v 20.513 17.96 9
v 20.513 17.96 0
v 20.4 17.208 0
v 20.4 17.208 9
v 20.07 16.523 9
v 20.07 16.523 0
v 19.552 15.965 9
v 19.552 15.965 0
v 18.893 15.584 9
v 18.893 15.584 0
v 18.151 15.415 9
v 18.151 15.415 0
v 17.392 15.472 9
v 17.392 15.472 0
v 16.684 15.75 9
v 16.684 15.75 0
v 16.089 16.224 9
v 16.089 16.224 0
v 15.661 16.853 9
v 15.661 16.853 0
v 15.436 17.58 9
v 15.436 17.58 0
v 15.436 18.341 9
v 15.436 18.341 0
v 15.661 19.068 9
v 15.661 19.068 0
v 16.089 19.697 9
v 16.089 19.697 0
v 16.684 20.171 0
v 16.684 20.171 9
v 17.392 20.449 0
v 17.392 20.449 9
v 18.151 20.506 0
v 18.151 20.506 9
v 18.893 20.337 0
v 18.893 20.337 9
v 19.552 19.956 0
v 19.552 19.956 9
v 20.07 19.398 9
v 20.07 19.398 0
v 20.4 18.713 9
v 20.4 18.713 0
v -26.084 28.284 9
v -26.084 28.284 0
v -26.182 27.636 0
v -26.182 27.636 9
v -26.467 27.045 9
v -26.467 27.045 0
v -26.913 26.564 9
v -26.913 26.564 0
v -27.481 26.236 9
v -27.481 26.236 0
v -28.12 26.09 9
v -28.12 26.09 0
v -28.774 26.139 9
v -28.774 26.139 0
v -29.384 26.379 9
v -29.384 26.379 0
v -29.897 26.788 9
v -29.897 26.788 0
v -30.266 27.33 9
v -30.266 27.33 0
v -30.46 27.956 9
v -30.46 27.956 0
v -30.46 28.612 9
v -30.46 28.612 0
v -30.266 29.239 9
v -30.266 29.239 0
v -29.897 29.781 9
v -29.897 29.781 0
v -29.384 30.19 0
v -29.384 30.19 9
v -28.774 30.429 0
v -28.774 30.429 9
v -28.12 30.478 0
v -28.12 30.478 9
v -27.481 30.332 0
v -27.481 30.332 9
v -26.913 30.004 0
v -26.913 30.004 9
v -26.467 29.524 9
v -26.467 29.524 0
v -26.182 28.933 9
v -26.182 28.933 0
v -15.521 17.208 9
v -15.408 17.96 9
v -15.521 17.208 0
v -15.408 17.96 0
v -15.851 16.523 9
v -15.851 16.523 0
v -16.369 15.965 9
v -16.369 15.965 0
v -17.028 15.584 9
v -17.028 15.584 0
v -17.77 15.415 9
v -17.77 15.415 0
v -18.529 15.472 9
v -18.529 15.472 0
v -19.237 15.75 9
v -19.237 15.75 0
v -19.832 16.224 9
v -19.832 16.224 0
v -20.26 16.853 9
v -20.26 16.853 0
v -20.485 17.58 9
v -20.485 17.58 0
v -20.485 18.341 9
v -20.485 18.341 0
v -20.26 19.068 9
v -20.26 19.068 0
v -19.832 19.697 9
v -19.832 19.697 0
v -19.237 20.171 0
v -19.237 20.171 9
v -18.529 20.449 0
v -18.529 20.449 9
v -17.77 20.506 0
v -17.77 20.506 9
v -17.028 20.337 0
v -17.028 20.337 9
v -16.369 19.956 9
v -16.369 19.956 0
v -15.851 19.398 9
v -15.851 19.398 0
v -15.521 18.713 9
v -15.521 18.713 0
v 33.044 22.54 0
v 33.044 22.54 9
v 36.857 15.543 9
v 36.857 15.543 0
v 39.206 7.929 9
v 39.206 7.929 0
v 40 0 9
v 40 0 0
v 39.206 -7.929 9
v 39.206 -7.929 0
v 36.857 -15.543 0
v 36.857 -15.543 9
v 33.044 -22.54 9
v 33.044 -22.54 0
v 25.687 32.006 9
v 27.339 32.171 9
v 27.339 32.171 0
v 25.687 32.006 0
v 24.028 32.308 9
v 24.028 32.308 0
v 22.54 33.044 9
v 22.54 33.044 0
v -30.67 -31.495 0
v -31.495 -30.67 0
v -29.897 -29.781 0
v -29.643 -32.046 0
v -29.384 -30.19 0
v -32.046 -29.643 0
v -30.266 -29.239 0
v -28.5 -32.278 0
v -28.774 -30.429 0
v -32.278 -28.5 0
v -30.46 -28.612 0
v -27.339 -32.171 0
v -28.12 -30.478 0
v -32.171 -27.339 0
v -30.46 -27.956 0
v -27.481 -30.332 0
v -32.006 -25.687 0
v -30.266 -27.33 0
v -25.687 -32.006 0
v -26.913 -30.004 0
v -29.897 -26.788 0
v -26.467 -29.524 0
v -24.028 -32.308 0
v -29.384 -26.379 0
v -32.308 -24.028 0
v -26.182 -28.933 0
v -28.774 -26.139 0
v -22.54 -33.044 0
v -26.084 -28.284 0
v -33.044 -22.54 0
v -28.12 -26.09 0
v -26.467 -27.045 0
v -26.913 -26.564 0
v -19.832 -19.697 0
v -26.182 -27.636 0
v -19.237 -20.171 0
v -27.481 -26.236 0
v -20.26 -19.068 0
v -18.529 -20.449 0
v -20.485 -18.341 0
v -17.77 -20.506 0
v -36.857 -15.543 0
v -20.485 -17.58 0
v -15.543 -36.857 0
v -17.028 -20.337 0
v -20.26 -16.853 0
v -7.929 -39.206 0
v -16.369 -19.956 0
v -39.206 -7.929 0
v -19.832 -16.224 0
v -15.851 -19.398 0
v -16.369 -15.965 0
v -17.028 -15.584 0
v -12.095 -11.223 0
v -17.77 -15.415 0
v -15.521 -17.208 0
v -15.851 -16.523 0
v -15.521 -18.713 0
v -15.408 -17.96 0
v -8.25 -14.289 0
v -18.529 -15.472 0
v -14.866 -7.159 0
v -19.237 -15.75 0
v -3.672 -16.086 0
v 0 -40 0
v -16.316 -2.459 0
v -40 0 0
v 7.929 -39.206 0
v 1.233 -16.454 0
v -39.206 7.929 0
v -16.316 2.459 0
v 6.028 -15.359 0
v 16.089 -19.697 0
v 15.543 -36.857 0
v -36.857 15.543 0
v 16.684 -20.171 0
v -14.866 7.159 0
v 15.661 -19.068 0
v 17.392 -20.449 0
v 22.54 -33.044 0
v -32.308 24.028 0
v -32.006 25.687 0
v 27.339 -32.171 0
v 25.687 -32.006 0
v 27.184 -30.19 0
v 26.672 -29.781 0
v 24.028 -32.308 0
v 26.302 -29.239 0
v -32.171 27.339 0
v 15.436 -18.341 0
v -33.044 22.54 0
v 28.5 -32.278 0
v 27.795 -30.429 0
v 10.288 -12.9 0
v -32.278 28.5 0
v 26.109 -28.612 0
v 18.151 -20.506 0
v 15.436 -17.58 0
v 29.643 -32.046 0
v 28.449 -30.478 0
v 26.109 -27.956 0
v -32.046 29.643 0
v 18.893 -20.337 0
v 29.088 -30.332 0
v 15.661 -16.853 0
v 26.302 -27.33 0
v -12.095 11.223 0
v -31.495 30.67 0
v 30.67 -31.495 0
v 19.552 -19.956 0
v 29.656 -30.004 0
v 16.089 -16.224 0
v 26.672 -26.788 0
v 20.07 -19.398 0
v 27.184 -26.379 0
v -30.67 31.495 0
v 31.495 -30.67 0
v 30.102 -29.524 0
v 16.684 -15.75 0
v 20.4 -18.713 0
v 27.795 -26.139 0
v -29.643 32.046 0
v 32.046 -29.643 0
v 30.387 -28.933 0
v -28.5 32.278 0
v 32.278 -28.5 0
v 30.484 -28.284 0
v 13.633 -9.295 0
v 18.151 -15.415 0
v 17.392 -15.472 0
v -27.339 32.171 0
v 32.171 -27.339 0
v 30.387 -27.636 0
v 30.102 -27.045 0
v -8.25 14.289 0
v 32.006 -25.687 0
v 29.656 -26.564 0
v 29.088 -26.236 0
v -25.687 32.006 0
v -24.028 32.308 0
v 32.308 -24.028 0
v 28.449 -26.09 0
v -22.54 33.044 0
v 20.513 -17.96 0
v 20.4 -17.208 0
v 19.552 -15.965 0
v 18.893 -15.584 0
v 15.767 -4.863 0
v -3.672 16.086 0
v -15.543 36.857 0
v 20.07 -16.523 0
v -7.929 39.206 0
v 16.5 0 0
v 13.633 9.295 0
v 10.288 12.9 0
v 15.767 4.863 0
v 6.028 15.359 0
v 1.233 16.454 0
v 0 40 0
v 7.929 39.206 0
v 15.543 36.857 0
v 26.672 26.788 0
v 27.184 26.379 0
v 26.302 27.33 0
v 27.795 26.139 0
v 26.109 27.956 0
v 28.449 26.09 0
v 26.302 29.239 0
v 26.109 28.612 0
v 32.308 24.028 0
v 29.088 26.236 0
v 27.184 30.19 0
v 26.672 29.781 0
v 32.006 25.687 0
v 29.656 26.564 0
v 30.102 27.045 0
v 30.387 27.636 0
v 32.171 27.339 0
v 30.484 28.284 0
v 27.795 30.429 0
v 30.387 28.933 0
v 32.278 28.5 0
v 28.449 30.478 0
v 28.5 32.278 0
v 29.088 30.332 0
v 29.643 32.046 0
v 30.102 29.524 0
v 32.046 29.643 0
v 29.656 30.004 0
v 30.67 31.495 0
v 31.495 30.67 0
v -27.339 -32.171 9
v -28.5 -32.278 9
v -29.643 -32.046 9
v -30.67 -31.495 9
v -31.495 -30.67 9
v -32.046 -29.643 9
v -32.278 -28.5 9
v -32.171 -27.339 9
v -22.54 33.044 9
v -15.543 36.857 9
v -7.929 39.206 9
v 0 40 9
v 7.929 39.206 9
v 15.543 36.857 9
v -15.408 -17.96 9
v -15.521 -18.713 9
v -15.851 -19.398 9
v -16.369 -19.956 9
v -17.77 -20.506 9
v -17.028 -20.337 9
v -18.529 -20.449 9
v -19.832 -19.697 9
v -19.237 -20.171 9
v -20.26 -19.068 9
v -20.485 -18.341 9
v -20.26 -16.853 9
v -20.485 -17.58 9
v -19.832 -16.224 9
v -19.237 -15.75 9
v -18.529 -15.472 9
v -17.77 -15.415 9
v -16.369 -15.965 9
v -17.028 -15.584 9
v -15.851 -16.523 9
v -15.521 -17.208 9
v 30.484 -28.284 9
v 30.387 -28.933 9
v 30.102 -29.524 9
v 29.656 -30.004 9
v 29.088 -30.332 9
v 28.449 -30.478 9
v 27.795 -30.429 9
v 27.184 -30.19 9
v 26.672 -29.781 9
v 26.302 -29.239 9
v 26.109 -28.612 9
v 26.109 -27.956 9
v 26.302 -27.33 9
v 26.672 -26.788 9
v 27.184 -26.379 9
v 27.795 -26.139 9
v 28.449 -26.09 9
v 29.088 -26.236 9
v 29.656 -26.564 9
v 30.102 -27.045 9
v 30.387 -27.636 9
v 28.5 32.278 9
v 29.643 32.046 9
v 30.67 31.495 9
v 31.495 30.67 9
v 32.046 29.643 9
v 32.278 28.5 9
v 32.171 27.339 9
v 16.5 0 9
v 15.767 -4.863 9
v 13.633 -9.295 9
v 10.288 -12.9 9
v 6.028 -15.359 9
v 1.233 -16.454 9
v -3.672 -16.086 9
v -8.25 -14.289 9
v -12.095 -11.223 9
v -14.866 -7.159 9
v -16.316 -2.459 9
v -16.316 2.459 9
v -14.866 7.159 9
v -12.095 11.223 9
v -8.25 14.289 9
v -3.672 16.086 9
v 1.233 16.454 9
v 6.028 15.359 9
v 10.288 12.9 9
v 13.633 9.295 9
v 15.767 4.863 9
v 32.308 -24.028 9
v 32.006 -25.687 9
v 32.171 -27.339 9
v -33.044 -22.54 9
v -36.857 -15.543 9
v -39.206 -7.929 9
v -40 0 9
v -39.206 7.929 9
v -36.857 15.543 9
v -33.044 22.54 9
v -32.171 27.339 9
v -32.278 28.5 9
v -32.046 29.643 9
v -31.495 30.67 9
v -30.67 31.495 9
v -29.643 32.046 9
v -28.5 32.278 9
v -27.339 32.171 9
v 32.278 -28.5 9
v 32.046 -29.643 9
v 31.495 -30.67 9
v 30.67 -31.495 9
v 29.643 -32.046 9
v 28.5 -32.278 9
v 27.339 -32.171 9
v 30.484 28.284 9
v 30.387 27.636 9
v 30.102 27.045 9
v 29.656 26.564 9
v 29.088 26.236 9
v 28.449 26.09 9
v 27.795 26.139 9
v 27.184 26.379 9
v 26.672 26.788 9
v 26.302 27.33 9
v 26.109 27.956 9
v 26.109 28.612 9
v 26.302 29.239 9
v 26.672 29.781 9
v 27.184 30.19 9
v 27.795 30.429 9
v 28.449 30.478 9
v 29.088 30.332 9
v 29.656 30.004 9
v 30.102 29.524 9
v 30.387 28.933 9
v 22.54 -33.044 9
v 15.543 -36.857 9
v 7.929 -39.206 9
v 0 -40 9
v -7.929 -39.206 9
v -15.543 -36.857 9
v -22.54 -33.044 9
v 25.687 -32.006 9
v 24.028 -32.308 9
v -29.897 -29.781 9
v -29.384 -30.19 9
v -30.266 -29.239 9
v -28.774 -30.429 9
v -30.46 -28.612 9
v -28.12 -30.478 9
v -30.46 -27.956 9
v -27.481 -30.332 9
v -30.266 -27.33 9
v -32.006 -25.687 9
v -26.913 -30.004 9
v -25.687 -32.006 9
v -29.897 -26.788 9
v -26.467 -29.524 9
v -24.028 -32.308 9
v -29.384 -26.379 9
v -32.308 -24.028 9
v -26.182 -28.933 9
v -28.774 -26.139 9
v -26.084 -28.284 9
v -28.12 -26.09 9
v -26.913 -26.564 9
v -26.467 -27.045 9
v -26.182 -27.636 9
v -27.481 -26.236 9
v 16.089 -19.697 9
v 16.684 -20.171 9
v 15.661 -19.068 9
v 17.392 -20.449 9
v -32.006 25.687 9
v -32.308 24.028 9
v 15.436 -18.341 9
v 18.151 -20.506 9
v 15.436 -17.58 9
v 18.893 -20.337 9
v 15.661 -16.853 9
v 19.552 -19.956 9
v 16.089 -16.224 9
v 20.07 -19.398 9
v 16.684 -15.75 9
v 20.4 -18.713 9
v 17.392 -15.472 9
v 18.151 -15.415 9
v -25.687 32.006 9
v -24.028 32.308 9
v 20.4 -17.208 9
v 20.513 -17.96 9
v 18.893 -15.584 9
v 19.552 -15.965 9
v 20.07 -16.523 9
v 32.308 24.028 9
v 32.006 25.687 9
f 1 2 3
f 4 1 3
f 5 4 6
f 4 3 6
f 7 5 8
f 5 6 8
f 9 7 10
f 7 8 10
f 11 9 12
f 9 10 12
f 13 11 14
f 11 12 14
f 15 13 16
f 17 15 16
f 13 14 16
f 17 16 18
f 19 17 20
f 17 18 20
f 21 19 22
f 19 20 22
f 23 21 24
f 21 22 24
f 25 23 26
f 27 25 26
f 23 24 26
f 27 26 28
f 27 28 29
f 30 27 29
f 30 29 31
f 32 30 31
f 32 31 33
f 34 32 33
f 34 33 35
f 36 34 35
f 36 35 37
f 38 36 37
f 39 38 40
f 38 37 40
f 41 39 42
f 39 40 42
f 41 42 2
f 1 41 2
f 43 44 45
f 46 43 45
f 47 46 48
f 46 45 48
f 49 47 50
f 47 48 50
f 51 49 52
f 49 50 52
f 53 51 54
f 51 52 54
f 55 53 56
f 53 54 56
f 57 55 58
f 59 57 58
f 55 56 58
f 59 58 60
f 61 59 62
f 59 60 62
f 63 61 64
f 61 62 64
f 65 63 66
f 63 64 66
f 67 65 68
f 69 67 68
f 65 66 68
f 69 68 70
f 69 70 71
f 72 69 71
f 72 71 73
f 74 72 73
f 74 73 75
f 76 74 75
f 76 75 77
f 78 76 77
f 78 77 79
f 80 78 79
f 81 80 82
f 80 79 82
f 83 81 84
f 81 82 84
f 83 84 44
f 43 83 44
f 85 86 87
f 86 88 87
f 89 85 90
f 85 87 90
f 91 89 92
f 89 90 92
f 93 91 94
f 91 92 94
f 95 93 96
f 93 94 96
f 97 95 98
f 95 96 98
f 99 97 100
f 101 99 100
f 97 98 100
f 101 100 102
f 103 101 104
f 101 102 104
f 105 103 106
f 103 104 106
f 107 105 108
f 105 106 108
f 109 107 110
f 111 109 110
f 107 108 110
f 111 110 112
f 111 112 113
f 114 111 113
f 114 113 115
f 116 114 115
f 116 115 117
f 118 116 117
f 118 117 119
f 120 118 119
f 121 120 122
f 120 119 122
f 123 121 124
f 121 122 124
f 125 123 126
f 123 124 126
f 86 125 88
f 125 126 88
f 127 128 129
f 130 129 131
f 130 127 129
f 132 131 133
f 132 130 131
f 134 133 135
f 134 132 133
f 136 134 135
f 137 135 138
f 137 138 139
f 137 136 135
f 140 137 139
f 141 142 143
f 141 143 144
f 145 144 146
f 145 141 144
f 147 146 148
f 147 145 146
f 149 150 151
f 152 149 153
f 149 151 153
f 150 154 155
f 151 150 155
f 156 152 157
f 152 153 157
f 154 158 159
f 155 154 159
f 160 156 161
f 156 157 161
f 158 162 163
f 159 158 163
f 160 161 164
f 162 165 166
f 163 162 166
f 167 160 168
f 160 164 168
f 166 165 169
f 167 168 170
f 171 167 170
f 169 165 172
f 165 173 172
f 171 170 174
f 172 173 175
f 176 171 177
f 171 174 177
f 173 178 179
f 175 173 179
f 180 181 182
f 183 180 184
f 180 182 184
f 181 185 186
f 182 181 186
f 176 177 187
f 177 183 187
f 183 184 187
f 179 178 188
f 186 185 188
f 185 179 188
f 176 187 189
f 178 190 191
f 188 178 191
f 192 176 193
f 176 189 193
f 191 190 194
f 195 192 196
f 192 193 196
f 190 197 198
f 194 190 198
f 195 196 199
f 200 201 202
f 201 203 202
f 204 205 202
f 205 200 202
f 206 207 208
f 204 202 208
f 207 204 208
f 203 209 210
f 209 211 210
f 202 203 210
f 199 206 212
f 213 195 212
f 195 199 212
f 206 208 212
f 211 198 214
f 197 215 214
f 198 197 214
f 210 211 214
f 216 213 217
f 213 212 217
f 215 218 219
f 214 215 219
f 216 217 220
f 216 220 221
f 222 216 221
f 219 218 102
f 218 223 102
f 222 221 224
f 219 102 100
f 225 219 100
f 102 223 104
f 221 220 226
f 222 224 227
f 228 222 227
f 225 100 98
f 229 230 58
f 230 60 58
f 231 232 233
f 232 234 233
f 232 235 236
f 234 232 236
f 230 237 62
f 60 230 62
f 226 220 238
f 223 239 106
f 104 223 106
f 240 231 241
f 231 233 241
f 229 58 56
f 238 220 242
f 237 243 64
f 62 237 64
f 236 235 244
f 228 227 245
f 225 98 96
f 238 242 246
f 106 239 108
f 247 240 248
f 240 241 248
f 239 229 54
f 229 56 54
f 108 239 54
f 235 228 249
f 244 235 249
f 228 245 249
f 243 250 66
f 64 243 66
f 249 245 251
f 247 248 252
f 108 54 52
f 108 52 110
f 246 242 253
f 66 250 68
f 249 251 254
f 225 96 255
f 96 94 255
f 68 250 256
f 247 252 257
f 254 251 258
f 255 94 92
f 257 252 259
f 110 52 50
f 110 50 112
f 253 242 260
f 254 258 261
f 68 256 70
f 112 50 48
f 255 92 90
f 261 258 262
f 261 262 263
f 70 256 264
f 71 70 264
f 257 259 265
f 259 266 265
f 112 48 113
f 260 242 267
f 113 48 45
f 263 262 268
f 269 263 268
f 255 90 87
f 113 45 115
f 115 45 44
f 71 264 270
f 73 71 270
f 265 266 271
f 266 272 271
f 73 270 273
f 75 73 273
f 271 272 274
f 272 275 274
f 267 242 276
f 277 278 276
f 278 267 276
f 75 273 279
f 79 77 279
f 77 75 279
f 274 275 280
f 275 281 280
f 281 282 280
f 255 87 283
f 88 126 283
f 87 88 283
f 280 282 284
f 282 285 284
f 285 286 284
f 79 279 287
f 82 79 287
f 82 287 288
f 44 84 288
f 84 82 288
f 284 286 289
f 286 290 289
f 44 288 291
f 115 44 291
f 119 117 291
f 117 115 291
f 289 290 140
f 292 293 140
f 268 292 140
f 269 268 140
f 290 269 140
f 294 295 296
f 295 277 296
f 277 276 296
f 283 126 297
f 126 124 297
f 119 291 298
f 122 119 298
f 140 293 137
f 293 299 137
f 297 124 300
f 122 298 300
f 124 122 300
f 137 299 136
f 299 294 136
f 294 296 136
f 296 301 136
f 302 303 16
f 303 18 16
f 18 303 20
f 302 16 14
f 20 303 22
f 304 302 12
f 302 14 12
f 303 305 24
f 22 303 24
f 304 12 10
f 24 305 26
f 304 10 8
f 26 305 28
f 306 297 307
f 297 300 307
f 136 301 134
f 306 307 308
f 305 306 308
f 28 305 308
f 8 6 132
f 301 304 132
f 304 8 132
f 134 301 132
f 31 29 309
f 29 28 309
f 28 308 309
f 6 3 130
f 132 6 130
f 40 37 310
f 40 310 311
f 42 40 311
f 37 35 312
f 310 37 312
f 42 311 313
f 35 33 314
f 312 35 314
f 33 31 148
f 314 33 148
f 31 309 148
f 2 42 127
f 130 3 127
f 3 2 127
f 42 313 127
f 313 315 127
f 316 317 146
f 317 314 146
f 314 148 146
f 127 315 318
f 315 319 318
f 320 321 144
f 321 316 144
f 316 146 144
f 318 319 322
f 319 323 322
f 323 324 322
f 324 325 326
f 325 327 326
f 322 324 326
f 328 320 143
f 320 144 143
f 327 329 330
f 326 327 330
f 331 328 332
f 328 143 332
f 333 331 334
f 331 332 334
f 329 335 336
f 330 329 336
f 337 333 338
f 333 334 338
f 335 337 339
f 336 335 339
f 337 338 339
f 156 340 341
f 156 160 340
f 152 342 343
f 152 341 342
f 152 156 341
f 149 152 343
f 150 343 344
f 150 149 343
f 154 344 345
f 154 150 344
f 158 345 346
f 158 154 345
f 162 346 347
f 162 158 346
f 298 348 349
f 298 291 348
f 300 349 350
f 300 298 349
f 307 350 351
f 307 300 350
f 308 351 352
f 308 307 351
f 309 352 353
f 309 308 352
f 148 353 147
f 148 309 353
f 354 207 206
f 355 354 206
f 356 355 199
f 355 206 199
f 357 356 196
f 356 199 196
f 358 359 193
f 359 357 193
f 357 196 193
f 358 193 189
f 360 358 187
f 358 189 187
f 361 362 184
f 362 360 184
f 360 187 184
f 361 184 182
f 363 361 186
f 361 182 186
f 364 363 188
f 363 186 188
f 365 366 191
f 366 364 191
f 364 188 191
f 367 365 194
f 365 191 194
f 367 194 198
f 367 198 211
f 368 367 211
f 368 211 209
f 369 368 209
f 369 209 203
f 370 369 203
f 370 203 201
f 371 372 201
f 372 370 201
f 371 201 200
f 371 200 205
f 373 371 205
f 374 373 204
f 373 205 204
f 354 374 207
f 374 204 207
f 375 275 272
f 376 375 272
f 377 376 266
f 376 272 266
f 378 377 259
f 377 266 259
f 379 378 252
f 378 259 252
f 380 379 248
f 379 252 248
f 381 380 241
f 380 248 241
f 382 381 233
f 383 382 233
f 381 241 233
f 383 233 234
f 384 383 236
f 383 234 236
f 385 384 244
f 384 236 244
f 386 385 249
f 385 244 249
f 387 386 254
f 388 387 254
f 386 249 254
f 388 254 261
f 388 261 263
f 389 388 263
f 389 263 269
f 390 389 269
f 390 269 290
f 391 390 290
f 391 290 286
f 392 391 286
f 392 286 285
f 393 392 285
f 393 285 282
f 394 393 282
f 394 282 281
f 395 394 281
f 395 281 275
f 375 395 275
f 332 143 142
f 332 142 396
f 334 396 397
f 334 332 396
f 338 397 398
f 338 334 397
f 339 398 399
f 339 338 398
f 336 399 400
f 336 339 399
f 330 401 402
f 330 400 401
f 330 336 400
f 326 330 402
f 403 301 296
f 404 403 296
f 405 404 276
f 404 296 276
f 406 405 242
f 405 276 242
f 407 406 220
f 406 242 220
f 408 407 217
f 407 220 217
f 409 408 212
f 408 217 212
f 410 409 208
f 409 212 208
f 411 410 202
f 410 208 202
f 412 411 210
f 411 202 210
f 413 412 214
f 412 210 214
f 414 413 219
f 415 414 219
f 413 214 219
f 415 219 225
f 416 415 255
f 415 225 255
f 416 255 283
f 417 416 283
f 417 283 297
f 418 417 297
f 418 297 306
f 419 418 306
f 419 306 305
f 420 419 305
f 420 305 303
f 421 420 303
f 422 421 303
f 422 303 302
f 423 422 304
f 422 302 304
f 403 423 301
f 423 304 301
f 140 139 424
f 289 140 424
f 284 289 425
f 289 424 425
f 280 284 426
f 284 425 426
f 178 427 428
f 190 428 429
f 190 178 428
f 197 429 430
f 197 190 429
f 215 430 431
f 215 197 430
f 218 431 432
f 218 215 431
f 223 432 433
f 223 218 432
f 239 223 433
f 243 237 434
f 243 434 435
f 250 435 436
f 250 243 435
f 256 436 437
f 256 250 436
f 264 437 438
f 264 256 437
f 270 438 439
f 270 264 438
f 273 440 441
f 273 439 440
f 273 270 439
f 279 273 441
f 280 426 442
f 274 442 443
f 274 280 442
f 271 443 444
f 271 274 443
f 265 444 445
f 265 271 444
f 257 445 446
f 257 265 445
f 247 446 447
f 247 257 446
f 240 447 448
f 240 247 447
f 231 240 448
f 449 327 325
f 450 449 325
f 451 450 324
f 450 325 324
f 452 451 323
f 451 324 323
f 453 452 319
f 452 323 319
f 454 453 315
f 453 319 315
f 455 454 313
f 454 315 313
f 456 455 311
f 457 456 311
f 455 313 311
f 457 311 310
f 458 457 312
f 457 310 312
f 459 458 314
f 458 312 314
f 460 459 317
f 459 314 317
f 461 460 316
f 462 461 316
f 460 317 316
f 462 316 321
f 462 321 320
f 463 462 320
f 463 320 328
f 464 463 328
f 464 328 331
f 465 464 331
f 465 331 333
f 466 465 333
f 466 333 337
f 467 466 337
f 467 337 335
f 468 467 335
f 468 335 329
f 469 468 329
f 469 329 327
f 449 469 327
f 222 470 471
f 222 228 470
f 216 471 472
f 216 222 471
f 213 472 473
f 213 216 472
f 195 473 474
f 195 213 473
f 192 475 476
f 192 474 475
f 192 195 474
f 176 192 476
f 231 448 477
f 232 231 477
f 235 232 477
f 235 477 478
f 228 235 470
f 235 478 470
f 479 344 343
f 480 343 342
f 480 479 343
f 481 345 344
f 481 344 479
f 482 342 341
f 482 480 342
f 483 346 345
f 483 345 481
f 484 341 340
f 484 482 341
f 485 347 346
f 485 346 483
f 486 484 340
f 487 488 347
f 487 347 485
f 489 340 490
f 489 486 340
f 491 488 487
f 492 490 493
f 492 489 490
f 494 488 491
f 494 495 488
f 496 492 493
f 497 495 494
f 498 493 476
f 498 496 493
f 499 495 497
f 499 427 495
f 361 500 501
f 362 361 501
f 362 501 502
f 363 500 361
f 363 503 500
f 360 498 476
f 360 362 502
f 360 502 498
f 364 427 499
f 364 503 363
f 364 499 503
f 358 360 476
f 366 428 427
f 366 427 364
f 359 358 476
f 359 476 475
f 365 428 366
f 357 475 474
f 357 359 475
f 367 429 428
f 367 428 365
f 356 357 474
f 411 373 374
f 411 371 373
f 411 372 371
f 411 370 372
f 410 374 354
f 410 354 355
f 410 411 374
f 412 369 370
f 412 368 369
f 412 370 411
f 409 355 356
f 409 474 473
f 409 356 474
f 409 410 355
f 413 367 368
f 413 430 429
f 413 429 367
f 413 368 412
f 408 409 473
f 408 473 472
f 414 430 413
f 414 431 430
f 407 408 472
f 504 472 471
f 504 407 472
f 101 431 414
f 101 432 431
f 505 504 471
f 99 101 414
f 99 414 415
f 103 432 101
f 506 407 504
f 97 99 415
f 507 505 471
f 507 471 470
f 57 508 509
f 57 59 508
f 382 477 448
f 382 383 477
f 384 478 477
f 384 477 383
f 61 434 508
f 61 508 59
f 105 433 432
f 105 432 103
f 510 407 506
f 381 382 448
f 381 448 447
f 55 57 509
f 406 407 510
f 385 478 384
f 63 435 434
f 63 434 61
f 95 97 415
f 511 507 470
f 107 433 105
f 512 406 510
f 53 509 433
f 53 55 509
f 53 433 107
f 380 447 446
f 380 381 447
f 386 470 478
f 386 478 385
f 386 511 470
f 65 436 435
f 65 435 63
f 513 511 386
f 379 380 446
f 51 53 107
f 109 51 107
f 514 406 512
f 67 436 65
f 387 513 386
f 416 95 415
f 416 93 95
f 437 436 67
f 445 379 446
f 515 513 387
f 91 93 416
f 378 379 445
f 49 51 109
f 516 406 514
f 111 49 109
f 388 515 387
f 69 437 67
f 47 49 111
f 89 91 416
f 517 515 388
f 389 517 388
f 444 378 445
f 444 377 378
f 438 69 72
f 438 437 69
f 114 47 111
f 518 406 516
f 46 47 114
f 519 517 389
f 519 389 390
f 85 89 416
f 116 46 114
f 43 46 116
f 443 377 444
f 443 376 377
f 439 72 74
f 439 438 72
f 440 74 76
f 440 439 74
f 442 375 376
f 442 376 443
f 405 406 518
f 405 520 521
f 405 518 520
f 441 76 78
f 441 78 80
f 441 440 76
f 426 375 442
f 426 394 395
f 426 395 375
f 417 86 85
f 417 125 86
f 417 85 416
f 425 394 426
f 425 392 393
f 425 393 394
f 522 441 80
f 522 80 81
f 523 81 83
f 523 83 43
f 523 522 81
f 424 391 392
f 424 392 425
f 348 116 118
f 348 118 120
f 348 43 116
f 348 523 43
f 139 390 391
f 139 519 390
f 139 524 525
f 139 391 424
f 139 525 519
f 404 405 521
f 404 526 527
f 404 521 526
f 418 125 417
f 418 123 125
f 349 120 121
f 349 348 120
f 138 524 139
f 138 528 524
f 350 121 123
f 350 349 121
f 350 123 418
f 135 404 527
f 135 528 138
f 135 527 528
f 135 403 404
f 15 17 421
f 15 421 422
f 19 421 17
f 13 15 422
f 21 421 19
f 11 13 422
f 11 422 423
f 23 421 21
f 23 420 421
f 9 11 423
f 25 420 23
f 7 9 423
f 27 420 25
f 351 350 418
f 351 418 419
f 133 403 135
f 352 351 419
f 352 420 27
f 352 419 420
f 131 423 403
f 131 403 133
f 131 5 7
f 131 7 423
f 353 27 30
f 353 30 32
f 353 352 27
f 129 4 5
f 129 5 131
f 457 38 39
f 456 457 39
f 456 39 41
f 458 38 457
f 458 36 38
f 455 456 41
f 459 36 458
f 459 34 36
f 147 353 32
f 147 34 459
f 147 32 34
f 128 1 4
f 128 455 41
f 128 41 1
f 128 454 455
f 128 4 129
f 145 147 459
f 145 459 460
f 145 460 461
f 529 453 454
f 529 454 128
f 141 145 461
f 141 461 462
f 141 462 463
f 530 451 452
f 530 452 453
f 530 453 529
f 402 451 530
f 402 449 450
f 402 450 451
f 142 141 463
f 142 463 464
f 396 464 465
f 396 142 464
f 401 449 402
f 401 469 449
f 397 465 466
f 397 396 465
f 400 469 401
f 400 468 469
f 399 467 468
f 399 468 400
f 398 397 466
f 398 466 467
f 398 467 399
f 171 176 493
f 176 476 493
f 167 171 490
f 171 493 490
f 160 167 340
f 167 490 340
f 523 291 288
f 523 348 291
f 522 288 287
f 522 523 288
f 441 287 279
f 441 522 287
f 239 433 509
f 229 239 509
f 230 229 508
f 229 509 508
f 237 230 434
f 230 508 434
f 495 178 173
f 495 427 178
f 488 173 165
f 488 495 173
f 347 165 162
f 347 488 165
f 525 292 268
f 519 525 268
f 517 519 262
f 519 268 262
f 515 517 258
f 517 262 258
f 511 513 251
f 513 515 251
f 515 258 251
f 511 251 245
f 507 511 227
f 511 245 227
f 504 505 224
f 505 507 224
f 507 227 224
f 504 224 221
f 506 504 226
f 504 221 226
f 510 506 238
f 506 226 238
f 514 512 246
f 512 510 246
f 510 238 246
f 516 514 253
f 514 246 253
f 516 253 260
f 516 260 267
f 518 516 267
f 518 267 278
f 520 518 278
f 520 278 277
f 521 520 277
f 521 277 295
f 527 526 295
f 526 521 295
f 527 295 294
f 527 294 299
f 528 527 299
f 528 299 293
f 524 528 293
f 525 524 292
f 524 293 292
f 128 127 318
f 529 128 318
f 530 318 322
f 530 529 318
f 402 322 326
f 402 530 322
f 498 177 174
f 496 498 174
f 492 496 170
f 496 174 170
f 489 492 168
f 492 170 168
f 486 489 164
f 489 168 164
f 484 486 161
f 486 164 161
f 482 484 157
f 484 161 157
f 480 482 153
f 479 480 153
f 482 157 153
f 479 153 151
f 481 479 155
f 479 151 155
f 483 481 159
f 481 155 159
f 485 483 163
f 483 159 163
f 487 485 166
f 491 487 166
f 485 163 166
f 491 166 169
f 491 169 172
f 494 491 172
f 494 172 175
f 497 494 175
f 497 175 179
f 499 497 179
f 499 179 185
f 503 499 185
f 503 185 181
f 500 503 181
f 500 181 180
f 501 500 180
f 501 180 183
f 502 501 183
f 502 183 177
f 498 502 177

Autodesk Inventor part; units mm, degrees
ref_plane "YZ Plane" through (0, 0, 0) normal (1, 0, 0) x (0, 1, 0)
ref_plane "XZ Plane" through (0, 0, 0) normal (0, 1, 0) x (-1, 0, 0)
ref_plane "XY Plane" through (0, 0, 0) normal (0, 0, 1) x (1, 0, 0)
sketch "Base" plane through (0, 0, 0) normal (0, 0, 1) x (1, 0, 0)
  circle A0 centre (0, 0) radius 50.8
  circle A1 centre (0, 0) radius 16.5
  line L0 (-71.12, 0) -> (71.12, 0)
  line L1 (0, -71.12) -> (0, 71.12) construction
  circle A2 centre (-17.9605, 17.9605) radius 2.5527
  circle A3 centre (17.9605, 17.9605) radius 2.5527
  circle A4 centre (17.9605, -17.9605) radius 2.5527
  circle A5 centre (-17.9605, -17.9605) radius 2.5527
  circle A6 centre (0, 0) radius 16 construction
  circle A7 centre (0, 0) radius 40
  line L2 (0, 0) -> (28.2843, 28.2843) construction
  circle A8 centre (28.2843, 28.2843) radius 2.2
  circle A9 centre (-28.2843, 28.2843) radius 2.2
  circle A10 centre (28.2843, -28.2843) radius 2.2
  circle A11 centre (-28.2843, -28.2843) radius 2.2
  circle A12 centre (28.2843, 28.2843) radius 4
  circle A13 centre (17.9605, 17.9605) radius 4
  circle A14 centre (-17.9605, 17.9605) radius 4
  circle A15 centre (-28.2843, 28.2843) radius 4
  line L3 (0, 0) -> (35.921, 35.921)
  line L4 (0, 0) -> (-35.921, 35.921)
  circle A16 centre (28.2843, -28.2843) radius 4
  circle A17 centre (-28.2843, -28.2843) radius 4
  circle A18 centre (17.9605, -17.9605) radius 4
  circle A19 centre (-17.9605, -17.9605) radius 4
  point P0 (-25.4558, 25.4558)
  point P1 (-20.7889, 20.7889)
  point P2 (-15.1321, 15.1321)
  point P3 (-11.6673, 11.6673)
  point P4 (11.6673, 11.6673)
  point P5 (15.1321, 15.1321)
  point P6 (20.7889, 20.7889)
  point P7 (25.4558, 25.4558)
  point P8 (31.1127, 31.1127)
  point P9 (-31.1127, 31.1127)
  point P10 (25.318, 30.9677)
  point P11 (-25.318, 30.9677)
  point P12 (-30.9677, 25.318)
  point P13 (-40, 0)
  point P14 (-16.5, 0)
  point P15 (16.5, 0)
  point P16 (40, 0)
  point P17 (30.9677, 25.318)
  point P18 (30.9677, -25.318)
  point P19 (-30.9677, -25.318)
  point P20 (-25.318, -30.9677)
  point P21 (25.318, -30.9677)
  dimension "d26" = 80
  dimension "d0" = 101.6
  dimension "d25" = 0.5
  dimension "d27" = 4.4
  dimension "d29" = 8
extrude "Plate1" add sketch "Base" along normal blind 9 contours A7 A16 A17 L0 A1 | L0 A1 L3 A13 A12 A7 | L3 A8 A7 A12 | A12 A7 A8 L3 | A7 A15 L4 A14 A1 L0 | A12 L3 A8 A7 | A16 A7 A10 | A7 A10 A16 | L4 A9 A7 A15 | A15 A7 A9 L4 | A12 L3 A13 A1 L4 A14 A15 A7 | A7 A8 L3 A12 | A7 A9 L4 A15 | A17 A7 A11 | A7 A11 A17 | A15 L4 A9 A7 | L3 A3 A13 | A13 L3 A3 | L4 A2 A14 | A14 L4 A2 | A18 | A19
fillet "Fillet2" radius 6 8 edges at (-30.9677, 25.318, 4.5) (-30.9677, -25.318, 4.5) (-25.318, -30.9677, 4.5) (25.318, -30.9677, 4.5) (30.9677, -25.318, 4.5) (30.9677, 25.318, 4.5) (25.318, 30.9677, 4.5) (-25.318, 30.9677, 4.5)
equation "\"d28\" = Thickness"
equation "\"BendRadius\" = Thickness"
equation "\"BendReliefWidth\" = Thickness"
equation "\"BendReliefDepth\" = 0.5 * Thickness"
equation "\"CornerReliefSize\" = 4 * Thickness"
equation "\"MinimumRemnant\" = 2 * Thickness"
equation "\"TransitionRadius\" = BendRadius"
equation "\"JacobiRadiusSize\" = BendRadius"
equation "\"GapSize\" = Thickness"
equation "\"Thickness\" = 9"
properties part number "CimCoderMount"
